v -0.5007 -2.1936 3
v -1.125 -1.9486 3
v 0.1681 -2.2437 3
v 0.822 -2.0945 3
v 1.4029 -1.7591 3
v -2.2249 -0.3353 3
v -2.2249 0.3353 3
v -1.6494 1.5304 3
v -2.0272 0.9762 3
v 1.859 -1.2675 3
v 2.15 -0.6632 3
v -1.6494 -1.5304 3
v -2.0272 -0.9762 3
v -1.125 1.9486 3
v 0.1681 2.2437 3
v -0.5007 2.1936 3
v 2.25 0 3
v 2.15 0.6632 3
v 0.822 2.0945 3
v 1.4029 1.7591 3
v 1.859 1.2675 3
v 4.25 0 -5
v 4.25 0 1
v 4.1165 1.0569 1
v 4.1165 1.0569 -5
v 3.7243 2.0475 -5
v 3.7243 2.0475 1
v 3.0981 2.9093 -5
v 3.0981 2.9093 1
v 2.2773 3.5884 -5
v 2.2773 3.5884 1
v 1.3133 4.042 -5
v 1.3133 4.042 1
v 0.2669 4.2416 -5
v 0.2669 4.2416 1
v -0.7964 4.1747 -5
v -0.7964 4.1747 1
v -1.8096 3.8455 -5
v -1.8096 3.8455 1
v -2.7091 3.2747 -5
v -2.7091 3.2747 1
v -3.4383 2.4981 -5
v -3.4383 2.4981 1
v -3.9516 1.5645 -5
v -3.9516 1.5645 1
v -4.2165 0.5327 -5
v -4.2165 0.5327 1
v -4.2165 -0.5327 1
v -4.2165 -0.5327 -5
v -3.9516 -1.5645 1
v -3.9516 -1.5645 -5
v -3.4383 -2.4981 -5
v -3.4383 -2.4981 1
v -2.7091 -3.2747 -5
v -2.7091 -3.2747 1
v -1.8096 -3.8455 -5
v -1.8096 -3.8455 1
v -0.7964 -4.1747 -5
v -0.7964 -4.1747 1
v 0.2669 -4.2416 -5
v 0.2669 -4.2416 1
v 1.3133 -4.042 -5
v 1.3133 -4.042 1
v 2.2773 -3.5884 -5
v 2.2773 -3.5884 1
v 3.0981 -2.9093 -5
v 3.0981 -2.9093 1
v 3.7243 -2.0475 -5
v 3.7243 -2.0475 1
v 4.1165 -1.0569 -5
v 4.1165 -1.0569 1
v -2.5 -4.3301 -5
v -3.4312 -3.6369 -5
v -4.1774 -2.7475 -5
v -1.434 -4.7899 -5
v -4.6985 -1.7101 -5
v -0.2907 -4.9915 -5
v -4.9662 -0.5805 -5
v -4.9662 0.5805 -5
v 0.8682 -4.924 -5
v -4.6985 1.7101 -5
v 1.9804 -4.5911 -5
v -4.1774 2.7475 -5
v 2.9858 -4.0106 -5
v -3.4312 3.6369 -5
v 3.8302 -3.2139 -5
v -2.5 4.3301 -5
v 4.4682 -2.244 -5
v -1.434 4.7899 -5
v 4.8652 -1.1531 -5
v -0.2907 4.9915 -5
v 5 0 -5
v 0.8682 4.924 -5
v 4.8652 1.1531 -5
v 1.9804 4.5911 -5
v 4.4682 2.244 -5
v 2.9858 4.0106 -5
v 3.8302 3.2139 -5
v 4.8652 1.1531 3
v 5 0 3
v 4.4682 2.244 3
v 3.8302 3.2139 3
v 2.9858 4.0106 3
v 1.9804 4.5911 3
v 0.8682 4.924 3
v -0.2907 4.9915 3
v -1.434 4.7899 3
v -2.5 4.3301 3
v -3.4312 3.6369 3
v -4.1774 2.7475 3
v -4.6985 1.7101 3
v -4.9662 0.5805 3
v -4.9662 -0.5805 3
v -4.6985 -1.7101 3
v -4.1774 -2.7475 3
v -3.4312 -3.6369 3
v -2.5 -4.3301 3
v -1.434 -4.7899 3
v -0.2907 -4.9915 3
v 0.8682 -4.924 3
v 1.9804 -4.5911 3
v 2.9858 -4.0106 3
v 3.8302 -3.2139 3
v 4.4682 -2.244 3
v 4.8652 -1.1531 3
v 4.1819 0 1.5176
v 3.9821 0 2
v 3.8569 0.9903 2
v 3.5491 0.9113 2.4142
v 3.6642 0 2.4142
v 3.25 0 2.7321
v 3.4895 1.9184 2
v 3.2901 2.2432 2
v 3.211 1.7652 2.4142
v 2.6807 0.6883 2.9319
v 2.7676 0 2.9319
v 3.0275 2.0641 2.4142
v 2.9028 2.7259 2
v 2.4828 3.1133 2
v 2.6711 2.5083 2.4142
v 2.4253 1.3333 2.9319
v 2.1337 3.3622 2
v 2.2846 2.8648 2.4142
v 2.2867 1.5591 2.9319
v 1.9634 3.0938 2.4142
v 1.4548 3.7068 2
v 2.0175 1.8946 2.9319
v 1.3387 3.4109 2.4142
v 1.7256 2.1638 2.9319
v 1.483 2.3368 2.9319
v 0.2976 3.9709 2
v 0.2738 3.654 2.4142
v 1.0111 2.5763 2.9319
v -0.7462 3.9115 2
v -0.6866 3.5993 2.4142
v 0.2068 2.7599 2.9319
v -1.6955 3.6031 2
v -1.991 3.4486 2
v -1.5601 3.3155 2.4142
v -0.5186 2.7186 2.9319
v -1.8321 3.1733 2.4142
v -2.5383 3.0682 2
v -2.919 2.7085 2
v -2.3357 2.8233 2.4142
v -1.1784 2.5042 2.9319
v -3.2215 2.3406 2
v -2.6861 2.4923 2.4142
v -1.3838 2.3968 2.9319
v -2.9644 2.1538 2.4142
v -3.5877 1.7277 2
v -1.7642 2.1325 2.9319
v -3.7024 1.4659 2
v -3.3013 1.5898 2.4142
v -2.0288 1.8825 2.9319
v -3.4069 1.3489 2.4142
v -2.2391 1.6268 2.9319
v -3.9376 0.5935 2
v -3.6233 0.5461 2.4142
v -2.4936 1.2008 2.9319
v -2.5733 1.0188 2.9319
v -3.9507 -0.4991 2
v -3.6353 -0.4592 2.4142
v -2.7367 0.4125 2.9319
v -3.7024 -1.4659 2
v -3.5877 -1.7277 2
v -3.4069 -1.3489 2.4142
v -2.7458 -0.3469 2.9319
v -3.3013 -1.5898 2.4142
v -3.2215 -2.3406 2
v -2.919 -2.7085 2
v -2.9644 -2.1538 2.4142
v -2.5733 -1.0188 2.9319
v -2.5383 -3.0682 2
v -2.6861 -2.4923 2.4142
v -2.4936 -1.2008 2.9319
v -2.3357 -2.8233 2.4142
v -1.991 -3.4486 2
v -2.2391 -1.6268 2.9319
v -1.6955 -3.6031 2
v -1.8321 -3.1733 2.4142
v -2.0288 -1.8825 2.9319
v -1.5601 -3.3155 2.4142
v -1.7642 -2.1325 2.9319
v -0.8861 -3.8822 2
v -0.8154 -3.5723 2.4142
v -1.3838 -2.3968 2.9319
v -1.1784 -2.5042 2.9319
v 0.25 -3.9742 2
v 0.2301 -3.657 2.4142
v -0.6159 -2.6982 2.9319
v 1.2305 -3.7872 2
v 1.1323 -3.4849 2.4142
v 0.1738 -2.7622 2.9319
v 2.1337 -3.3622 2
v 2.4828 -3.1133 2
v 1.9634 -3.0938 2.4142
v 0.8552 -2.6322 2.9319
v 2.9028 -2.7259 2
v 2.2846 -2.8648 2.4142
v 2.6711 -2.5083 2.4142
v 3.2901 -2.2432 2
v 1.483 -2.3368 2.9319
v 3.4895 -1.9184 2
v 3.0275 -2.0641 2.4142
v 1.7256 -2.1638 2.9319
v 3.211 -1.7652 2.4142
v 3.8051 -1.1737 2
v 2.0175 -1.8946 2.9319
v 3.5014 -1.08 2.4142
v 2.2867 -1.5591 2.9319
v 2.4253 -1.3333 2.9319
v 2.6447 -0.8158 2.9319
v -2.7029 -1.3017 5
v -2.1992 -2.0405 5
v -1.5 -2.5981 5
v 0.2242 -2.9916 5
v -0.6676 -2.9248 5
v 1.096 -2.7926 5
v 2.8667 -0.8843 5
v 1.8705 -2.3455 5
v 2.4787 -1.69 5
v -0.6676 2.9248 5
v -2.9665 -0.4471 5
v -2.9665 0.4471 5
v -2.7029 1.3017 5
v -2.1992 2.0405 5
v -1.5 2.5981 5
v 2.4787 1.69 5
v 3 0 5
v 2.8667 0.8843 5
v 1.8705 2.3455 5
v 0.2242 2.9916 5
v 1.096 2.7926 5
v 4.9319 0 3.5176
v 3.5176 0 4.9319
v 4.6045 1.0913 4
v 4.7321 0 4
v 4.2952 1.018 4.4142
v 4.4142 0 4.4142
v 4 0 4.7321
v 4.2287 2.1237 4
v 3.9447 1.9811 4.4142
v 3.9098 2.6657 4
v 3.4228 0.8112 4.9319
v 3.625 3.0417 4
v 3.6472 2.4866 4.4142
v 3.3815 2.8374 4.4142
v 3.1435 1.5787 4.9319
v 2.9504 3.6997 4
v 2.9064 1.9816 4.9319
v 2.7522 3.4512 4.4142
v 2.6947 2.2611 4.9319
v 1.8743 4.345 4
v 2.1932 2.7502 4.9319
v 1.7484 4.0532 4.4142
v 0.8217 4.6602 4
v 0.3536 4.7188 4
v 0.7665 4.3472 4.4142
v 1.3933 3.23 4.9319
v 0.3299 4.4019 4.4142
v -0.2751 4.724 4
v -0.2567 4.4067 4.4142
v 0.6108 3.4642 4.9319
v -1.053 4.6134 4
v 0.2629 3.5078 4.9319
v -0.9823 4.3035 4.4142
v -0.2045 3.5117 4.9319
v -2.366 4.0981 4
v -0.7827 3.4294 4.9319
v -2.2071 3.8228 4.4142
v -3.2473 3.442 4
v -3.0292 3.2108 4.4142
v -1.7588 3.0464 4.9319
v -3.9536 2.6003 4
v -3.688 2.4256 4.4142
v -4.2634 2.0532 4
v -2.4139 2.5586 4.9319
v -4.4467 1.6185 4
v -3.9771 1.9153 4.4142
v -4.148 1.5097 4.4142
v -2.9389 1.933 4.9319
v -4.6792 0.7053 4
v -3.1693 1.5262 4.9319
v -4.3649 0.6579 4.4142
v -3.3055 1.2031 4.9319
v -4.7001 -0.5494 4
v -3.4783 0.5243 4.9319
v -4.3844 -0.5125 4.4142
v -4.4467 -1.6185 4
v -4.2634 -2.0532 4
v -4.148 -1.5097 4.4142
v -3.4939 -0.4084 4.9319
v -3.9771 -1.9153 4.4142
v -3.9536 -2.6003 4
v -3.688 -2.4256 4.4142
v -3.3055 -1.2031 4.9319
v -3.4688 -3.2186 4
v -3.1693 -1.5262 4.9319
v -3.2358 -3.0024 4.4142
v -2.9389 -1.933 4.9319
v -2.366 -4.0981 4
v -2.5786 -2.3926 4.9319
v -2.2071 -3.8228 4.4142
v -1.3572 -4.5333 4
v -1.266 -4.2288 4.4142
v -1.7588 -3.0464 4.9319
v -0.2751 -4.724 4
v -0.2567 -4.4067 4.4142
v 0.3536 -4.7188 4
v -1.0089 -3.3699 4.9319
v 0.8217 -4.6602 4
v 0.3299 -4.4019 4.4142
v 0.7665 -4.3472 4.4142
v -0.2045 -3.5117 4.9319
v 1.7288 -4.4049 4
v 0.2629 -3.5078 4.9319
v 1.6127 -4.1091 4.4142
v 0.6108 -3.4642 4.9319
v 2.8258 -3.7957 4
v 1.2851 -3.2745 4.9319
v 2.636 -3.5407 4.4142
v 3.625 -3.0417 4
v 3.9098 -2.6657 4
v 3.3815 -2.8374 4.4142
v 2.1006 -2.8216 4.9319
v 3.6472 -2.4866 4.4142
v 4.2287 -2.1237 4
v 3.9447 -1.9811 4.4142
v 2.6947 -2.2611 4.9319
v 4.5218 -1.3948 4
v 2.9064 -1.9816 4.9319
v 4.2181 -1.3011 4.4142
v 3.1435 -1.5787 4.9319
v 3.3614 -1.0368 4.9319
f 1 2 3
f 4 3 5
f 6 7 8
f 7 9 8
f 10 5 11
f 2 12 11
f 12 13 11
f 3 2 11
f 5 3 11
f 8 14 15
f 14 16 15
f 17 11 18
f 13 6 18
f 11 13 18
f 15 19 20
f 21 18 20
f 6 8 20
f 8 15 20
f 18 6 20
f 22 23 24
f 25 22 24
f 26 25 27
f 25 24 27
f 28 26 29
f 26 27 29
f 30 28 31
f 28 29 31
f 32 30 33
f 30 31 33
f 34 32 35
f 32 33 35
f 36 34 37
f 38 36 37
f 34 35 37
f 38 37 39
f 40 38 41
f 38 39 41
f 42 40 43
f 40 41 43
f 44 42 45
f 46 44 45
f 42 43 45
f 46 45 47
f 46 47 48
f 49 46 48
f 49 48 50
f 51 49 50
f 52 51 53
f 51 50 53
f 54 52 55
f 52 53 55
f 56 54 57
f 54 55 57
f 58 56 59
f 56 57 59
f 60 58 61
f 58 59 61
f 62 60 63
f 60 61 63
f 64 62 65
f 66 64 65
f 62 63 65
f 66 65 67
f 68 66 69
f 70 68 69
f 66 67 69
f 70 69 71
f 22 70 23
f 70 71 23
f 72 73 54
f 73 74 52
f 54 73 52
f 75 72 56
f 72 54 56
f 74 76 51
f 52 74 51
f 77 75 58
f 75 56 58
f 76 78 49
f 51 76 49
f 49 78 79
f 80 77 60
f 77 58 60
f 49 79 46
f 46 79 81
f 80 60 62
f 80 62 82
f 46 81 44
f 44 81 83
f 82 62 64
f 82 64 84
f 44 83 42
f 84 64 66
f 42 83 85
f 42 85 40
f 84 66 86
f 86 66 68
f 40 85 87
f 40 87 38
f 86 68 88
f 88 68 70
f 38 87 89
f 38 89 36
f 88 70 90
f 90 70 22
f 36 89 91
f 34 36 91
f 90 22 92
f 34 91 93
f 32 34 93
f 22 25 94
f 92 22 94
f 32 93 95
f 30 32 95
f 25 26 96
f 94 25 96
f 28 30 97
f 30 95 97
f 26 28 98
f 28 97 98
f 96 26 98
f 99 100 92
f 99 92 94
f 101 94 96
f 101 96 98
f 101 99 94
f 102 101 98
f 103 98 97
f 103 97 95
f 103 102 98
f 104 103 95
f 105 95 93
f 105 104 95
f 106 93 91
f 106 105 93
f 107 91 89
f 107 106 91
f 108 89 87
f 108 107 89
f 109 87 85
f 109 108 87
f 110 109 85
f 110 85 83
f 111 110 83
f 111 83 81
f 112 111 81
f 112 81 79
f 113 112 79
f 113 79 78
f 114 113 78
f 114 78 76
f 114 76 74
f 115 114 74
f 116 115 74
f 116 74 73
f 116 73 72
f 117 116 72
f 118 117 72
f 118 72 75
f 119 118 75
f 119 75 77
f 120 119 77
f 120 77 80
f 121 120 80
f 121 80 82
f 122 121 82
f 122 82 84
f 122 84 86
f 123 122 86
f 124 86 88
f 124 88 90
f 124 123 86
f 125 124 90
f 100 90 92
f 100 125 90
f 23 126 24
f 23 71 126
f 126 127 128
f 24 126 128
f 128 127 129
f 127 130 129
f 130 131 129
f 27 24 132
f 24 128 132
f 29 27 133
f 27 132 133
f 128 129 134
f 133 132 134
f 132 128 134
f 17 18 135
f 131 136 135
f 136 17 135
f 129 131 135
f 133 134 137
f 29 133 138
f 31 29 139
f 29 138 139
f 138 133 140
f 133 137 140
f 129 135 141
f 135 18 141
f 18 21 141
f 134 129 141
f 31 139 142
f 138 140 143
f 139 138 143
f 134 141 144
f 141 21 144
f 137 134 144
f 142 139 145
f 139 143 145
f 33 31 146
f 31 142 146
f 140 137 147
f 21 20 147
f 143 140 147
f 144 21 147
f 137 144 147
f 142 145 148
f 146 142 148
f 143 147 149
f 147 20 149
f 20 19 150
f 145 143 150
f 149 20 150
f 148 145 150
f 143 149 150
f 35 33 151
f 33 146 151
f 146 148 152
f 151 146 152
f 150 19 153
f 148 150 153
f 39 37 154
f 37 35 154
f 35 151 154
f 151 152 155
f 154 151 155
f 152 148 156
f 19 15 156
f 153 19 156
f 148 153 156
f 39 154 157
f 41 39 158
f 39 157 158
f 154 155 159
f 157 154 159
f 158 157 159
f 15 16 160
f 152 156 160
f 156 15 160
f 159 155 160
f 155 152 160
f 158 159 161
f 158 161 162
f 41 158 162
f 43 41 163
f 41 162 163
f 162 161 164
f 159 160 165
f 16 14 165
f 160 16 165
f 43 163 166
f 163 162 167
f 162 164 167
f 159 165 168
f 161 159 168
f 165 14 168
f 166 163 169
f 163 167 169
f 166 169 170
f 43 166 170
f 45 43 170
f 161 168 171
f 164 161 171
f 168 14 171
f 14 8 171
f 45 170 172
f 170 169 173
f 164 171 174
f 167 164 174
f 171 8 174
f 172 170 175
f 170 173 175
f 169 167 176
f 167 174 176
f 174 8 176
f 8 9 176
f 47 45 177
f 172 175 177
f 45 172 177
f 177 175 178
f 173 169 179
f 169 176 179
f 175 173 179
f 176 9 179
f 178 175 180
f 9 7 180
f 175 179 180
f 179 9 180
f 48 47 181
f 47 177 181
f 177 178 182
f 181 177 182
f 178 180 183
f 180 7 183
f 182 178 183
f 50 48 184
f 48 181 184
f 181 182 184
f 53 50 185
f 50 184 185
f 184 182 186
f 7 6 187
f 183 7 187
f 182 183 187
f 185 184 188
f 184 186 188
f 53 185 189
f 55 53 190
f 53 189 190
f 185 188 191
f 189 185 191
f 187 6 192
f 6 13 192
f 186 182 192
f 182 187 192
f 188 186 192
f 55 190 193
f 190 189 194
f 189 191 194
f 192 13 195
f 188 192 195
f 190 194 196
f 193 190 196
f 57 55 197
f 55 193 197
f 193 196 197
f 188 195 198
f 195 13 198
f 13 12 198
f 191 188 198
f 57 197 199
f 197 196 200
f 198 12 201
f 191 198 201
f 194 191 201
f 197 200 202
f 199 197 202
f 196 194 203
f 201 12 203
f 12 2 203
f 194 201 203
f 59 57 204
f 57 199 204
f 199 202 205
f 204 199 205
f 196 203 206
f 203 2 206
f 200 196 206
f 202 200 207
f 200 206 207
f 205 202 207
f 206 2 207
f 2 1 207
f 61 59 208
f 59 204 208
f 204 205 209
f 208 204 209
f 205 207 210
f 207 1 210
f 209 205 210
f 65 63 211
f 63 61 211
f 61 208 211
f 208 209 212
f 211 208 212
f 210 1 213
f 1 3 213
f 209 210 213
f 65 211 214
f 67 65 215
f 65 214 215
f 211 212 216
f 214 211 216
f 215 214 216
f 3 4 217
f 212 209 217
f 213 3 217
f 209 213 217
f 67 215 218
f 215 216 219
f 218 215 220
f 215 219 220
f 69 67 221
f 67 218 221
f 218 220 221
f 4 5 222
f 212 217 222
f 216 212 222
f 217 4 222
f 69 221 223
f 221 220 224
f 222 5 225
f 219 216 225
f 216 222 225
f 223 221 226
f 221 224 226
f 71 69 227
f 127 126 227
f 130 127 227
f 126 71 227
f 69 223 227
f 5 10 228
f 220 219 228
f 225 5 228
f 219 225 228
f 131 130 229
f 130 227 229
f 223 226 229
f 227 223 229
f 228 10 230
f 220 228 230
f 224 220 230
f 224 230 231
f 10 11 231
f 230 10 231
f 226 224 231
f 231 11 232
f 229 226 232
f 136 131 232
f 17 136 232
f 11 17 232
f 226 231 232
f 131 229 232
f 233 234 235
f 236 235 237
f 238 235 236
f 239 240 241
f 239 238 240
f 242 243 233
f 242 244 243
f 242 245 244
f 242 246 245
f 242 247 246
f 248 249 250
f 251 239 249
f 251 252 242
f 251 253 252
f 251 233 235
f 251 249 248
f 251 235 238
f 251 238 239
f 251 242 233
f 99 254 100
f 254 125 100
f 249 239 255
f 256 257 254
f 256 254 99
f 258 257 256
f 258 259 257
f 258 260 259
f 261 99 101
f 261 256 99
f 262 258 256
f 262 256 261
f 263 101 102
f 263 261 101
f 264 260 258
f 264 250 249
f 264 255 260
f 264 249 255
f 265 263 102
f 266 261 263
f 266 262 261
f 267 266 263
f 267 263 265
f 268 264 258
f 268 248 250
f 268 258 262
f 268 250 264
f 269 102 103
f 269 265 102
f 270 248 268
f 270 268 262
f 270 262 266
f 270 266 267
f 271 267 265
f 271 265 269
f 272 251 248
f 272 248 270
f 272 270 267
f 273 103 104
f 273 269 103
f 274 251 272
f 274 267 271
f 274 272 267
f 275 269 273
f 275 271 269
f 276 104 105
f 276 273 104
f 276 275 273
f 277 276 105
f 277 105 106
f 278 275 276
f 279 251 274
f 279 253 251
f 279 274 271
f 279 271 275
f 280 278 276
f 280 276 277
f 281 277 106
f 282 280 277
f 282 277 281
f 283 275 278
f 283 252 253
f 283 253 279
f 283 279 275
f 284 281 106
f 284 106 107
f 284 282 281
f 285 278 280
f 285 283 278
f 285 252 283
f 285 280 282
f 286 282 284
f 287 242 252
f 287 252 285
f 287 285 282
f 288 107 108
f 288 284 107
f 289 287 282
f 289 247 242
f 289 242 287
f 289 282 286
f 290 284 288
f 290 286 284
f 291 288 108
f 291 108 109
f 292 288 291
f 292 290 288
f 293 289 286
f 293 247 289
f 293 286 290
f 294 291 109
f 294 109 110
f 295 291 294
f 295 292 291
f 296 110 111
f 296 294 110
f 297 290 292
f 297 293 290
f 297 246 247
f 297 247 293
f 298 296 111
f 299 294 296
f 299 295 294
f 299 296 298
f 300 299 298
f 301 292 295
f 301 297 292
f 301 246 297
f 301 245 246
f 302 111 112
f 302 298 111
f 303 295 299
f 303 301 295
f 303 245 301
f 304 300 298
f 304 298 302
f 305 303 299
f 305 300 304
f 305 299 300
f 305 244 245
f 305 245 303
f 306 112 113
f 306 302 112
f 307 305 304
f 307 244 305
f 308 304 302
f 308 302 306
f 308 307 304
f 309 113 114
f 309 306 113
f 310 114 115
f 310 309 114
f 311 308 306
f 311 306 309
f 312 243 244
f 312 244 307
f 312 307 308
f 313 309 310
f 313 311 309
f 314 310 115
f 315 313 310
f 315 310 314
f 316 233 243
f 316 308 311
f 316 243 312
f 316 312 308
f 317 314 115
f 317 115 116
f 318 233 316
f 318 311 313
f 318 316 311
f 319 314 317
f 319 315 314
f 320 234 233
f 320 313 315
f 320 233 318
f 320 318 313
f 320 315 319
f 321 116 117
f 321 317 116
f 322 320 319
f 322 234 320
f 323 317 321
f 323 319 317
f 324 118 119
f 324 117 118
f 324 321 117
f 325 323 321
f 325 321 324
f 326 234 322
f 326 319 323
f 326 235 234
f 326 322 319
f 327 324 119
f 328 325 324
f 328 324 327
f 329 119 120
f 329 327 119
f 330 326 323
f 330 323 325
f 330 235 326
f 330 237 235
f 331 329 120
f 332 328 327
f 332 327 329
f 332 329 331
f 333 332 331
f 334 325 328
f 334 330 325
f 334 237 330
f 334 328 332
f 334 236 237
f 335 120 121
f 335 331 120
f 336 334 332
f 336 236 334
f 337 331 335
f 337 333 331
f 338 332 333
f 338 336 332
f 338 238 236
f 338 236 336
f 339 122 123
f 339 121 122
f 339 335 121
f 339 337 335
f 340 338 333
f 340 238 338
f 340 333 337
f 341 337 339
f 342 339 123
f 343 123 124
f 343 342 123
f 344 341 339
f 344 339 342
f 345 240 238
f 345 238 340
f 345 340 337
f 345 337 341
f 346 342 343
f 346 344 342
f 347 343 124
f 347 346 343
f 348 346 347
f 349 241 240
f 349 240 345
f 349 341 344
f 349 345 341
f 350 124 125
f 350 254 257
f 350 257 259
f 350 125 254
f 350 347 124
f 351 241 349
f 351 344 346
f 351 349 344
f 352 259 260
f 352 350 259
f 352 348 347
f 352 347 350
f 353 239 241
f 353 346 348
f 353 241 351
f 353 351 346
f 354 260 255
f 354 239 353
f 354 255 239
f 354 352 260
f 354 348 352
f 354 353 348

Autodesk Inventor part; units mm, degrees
sketch "Skizze1" plane through (0, 0, 0) normal (0, 0, 1) x (1, 0, 0)
  circle A0 centre (0, 0) radius 5
  line L0 (0, 81.3997) -> (0, -19.4) projected
  circle A1 centre (0, 0) radius 4.25
  point P0 (37.012, 66.9998)
  dimension "d0" = 10
  dimension "d1" = 8.5
extrude "Extrusion1" add sketch "Skizze1" along normal mid plane 10 contours A0 L0 A1 | L0 A1 A0
sketch "Skizze2" plane through (0, 0, 5) normal (0, 0, 1) x (1, 0, 0)
  circle A0 centre (0, 0) radius 5 projected
extrude "Extrusion2" add sketch "Skizze2" against normal blind 2
fillet "Rundung1" radius 2 1 edges at (-4.25, 0, 3)
fillet "Rundung2" radius 2 1 edges at (-5, 0, 5)
properties part number "Sirene"
